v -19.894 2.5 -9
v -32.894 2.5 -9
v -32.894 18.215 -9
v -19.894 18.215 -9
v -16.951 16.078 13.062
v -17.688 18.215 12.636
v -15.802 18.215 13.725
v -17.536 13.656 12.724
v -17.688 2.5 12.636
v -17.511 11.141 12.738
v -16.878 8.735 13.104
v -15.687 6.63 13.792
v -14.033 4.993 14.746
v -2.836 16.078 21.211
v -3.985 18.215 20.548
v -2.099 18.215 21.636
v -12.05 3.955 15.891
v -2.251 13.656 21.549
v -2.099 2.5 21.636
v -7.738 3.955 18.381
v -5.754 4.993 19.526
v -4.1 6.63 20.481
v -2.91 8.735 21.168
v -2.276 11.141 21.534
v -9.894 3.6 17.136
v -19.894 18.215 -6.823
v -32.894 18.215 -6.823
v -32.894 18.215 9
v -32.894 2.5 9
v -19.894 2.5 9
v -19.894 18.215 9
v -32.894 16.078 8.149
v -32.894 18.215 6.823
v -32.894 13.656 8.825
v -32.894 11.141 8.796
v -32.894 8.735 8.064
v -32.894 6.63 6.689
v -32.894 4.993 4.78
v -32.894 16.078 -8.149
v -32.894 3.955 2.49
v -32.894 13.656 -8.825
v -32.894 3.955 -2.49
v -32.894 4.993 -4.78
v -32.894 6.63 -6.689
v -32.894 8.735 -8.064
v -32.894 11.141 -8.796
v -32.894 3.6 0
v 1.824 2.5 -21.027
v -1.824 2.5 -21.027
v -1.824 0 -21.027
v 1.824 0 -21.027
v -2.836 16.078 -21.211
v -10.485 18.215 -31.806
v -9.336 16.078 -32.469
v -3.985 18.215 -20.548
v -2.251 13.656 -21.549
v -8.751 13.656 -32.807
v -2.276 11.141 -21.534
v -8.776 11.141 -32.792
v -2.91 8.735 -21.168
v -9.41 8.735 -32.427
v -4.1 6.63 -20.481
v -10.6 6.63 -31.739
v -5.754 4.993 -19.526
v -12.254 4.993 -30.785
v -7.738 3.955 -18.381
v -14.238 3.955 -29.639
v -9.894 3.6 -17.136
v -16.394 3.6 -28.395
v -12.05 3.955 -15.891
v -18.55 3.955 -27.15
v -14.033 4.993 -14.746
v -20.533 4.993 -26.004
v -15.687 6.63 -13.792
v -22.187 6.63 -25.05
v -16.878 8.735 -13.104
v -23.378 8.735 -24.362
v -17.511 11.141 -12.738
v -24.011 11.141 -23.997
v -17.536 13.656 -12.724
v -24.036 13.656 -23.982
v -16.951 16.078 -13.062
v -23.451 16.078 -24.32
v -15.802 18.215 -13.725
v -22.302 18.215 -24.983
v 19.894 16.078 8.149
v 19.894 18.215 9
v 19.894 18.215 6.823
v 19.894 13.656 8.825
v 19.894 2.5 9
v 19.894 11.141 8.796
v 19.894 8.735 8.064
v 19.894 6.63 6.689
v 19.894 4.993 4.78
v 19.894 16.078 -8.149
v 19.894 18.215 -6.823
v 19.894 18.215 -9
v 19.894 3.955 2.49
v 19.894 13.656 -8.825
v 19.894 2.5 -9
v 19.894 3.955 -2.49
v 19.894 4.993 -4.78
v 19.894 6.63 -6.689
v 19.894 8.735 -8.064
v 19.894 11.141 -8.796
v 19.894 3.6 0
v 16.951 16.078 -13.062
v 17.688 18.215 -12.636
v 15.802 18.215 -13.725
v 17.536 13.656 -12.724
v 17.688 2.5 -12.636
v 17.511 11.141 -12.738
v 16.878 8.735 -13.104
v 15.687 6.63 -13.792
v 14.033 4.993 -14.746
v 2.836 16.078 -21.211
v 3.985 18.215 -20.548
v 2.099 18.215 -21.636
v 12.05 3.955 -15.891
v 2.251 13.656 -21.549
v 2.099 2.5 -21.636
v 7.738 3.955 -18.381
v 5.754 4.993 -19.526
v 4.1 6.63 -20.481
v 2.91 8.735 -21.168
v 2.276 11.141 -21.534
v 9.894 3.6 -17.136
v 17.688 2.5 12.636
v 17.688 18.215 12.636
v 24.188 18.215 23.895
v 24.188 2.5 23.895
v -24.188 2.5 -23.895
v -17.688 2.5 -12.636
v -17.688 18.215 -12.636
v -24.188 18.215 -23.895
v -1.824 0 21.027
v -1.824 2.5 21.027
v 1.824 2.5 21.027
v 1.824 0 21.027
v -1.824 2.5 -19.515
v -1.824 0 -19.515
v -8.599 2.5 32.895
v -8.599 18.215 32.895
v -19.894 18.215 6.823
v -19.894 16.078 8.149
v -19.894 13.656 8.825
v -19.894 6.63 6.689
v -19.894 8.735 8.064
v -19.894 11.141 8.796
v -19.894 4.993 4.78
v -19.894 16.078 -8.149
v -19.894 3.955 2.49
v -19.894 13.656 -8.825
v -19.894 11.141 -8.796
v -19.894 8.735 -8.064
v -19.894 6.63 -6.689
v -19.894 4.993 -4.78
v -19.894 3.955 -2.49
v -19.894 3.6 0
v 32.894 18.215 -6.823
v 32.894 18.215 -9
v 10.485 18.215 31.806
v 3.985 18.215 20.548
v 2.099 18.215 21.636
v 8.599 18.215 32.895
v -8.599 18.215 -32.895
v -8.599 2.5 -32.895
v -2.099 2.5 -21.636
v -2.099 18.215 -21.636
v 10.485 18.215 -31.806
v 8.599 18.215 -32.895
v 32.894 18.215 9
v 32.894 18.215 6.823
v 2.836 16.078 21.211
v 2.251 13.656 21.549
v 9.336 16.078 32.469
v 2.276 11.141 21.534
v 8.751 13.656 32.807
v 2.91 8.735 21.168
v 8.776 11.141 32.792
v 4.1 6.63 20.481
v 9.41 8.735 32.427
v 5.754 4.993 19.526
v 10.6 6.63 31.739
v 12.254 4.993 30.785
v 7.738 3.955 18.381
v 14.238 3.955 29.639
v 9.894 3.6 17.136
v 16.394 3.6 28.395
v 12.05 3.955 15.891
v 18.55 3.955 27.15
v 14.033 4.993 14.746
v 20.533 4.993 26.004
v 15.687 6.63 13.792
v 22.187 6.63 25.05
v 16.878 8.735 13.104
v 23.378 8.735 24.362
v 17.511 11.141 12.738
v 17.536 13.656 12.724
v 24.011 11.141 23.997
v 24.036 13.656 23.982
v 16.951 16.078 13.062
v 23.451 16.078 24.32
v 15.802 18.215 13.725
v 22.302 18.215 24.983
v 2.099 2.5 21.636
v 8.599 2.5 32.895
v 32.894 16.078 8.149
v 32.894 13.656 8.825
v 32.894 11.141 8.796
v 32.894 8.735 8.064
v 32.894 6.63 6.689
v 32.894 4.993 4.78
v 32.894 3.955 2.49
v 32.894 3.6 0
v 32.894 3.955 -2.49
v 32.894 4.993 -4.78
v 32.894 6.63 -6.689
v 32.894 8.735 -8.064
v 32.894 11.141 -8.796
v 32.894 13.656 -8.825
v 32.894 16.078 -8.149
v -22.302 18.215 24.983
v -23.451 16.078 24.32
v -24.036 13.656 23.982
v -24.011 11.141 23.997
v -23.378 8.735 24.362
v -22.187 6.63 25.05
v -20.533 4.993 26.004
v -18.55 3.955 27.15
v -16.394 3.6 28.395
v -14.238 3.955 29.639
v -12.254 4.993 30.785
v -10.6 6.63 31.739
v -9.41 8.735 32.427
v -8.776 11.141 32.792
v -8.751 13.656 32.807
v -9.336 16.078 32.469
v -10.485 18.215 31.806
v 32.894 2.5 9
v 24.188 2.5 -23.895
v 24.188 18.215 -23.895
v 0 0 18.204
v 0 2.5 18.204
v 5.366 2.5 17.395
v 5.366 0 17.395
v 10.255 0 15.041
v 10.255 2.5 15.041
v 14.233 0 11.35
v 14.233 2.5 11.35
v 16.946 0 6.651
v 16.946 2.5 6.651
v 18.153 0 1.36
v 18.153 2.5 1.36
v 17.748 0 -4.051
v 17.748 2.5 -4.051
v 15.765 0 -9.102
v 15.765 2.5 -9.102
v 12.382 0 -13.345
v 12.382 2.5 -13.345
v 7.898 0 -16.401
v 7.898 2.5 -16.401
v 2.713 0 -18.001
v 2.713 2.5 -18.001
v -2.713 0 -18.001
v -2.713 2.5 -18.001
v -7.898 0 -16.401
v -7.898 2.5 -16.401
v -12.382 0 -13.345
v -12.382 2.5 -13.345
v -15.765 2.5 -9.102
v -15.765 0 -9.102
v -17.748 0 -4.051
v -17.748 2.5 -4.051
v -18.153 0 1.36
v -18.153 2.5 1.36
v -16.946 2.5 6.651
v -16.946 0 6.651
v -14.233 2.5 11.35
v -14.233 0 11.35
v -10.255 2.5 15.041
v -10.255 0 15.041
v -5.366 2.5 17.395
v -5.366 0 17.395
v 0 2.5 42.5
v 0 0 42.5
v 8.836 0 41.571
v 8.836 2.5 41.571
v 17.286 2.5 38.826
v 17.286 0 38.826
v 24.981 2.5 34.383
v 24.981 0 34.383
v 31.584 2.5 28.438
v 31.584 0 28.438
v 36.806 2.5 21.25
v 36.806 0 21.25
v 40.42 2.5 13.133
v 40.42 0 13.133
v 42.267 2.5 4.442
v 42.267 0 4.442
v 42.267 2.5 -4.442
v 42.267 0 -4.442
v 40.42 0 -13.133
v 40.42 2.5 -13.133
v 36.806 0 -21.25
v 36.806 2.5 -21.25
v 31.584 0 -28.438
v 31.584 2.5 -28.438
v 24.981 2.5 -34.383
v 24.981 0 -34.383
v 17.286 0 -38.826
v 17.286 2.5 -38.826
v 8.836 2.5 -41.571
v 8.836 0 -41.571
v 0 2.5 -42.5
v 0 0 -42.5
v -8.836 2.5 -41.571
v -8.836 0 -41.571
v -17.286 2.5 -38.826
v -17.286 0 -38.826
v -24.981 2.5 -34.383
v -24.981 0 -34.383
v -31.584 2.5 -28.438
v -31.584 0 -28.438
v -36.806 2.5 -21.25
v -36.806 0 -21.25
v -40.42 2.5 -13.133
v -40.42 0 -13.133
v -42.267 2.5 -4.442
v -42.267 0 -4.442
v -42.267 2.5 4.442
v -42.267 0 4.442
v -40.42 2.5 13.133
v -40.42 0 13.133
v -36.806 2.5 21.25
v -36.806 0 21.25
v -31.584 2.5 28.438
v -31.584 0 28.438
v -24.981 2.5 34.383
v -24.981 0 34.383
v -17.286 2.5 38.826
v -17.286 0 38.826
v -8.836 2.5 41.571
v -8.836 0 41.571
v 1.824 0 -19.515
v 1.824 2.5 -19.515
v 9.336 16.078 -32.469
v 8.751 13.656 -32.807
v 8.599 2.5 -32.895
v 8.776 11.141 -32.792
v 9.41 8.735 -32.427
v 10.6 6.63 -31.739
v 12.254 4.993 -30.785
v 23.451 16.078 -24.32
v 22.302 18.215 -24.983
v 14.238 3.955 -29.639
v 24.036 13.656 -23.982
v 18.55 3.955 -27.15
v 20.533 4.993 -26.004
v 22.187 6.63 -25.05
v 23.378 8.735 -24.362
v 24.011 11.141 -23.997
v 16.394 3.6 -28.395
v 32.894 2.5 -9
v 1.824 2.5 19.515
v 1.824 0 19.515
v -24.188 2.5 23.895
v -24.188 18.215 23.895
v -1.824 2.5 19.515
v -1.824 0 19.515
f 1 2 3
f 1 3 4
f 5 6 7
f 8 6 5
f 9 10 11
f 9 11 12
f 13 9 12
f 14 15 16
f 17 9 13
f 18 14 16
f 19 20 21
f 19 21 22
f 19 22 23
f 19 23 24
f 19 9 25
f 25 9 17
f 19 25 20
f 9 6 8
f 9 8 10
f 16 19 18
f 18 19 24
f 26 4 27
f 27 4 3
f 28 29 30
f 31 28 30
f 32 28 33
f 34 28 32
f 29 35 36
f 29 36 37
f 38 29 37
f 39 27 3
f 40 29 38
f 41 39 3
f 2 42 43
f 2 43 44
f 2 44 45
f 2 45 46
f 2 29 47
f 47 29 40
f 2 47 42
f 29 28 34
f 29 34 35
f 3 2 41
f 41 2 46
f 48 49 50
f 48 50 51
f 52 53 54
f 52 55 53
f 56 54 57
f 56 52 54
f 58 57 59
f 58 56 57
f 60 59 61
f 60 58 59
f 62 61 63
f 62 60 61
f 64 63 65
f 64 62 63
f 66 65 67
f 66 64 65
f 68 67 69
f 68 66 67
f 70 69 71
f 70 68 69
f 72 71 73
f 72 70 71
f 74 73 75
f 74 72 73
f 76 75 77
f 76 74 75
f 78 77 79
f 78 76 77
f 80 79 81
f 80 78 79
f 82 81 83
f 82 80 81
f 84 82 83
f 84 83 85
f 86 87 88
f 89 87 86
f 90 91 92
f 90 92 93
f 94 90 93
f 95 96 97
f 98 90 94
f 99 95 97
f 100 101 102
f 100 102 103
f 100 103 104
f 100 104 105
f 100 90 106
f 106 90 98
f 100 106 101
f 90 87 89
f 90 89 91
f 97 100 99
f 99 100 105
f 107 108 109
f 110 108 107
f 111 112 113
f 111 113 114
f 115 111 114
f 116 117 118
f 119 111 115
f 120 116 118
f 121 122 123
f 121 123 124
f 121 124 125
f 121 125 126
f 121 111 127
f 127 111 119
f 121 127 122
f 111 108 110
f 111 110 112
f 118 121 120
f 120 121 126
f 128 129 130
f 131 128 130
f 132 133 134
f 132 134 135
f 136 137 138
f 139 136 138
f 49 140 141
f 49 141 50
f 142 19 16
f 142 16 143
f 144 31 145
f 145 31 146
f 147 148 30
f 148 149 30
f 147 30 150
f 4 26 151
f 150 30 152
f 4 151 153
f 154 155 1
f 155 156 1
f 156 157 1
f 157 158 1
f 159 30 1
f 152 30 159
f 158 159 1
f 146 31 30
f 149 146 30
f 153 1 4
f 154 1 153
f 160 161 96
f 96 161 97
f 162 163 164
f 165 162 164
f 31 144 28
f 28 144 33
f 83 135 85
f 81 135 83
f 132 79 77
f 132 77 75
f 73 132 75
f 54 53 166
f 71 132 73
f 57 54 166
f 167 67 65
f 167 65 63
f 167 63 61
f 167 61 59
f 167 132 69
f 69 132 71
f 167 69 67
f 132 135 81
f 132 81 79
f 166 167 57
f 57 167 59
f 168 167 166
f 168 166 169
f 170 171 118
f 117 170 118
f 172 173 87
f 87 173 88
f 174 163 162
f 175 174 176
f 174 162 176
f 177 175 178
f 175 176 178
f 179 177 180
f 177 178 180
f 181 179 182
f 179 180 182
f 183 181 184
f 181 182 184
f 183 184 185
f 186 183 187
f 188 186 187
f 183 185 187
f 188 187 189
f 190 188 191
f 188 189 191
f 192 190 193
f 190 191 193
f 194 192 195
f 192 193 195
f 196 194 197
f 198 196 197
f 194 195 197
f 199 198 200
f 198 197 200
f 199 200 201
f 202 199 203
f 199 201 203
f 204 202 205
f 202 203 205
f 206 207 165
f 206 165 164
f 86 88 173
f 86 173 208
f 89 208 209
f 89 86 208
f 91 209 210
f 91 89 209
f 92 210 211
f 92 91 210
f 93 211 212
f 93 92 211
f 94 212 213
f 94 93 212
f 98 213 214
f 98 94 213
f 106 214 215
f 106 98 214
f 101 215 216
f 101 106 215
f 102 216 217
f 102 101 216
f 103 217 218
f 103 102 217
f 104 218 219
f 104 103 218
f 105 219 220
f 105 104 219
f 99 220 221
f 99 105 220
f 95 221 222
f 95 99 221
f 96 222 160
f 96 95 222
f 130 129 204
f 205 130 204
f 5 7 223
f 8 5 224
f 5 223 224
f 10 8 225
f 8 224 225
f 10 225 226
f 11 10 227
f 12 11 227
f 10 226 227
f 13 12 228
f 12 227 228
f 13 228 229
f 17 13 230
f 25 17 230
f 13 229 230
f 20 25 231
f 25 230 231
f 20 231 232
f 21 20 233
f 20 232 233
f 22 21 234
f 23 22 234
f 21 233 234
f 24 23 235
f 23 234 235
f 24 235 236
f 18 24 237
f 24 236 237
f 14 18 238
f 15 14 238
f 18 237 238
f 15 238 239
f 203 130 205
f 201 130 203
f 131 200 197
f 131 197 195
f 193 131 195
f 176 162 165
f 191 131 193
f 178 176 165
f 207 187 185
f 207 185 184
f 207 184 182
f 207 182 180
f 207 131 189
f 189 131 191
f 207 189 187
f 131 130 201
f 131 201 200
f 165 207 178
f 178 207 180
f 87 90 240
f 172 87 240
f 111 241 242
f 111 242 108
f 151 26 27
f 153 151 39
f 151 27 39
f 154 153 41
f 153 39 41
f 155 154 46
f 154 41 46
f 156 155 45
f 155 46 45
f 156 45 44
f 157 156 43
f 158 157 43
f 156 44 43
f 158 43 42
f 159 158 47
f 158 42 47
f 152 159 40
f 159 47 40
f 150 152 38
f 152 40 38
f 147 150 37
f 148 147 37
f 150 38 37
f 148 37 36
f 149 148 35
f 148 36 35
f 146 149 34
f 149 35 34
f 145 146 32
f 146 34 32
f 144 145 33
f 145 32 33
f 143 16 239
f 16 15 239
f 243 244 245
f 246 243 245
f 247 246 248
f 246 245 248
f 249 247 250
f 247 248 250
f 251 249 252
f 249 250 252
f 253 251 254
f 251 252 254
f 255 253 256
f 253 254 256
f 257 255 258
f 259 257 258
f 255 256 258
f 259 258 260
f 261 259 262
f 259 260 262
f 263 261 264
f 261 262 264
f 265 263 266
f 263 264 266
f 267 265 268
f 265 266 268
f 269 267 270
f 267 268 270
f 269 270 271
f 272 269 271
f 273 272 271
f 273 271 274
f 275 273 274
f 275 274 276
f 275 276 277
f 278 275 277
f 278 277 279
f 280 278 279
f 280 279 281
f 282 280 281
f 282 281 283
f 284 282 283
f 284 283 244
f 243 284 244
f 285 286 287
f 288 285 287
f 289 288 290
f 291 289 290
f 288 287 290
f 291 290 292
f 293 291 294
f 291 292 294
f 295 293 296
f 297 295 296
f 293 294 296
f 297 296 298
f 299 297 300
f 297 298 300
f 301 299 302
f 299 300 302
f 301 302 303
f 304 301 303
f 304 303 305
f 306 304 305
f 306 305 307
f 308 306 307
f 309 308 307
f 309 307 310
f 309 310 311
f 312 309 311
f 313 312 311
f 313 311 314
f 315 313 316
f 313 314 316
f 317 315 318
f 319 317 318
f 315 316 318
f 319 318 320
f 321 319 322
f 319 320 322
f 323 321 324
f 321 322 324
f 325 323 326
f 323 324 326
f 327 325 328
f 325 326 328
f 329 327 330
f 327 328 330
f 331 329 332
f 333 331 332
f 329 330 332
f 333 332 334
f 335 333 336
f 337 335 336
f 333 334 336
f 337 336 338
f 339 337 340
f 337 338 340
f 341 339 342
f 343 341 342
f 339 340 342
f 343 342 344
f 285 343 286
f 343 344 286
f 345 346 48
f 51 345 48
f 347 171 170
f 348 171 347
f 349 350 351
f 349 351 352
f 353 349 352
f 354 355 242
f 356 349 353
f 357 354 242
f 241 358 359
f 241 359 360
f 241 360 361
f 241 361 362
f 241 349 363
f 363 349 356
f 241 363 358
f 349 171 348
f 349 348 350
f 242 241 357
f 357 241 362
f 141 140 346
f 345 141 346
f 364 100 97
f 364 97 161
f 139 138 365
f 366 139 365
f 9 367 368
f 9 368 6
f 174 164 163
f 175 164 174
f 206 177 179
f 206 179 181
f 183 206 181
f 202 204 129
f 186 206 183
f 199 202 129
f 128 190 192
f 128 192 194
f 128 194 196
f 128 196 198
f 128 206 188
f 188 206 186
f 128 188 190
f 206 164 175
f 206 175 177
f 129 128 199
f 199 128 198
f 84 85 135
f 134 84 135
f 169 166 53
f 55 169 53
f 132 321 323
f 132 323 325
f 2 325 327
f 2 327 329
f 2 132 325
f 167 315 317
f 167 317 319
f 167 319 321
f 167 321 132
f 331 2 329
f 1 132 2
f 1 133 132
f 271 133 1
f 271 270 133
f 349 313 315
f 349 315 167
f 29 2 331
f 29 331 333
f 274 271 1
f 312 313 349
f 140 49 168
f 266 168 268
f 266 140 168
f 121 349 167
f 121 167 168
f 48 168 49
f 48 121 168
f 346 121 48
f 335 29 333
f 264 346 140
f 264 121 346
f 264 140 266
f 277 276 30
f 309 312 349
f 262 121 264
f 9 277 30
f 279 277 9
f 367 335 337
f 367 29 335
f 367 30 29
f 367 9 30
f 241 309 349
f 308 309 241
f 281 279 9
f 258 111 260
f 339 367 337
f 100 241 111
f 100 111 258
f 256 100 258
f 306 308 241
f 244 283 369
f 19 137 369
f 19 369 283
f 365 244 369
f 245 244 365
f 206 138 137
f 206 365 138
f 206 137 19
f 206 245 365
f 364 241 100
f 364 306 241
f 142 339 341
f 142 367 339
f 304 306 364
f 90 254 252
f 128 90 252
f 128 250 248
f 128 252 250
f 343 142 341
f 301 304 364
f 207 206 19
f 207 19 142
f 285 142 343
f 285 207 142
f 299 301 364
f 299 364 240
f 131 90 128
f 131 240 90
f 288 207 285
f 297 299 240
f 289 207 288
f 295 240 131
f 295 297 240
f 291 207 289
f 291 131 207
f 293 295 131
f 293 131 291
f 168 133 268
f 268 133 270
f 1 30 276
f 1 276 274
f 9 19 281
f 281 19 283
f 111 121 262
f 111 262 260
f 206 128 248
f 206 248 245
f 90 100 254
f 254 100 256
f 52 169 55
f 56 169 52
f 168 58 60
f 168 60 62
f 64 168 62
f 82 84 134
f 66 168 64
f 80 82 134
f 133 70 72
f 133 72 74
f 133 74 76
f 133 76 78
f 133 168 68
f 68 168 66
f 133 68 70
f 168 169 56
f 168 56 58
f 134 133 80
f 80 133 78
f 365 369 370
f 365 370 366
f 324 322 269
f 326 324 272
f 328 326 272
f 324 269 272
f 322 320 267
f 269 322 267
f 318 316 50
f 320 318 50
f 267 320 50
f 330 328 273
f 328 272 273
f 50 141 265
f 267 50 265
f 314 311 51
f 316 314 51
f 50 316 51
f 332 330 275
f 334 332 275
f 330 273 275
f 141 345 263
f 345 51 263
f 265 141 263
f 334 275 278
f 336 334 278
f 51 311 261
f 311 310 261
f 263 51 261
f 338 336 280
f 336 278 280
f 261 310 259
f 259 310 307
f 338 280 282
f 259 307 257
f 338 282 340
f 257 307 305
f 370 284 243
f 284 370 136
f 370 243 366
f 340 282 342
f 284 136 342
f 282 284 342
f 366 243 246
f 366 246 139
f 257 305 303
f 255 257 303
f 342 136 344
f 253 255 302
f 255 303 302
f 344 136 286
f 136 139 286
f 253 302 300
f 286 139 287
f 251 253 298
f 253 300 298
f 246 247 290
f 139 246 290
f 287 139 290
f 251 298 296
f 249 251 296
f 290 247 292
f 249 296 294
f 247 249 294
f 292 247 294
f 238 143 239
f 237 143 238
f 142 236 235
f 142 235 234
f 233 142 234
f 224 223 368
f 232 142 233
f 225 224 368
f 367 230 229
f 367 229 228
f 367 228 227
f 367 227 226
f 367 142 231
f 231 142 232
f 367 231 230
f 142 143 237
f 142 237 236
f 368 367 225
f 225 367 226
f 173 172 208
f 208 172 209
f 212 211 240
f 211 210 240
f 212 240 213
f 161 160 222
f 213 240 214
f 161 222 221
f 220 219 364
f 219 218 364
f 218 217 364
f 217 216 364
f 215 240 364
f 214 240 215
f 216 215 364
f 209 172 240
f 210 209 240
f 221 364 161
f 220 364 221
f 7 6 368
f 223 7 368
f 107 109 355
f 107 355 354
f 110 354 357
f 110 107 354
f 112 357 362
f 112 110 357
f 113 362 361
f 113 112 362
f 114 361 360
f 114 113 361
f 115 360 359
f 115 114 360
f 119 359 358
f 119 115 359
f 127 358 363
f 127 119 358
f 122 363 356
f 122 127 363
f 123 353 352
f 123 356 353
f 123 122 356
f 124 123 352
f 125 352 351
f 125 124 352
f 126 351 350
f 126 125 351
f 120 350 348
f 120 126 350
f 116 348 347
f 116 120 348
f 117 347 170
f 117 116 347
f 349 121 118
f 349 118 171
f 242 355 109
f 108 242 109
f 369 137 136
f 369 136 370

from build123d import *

# Parameters (mm, degrees)
SKETCH1_R           = 42.5
BOSS_EXTRUDE1_DEPTH = 2.5
SKETCH3_W           = 13
SKETCH3_H           = 18
BOSS_EXTRUDE2_DEPTH = 20
SKETCH4_R           = 8.9
CUT_EXTRUDE2_DEPTH  = 20
SKETCH5_R           = 8.9
CUT_EXTRUDE3_DEPTH  = 20
SKETCH6_R           = 8.9
CUT_EXTRUDE4_DEPTH  = 20
CUT_EXTRUDE5_START  = -20
SKETCH7_R           = 8.9
CUT_EXTRUDE5_DEPTH  = 20
CUT_EXTRUDE6_START  = -20
SKETCH8_R           = 8.9
CUT_EXTRUDE6_DEPTH  = 20
CUT_EXTRUDE7_START  = -20
SKETCH9_R           = 8.9
CUT_EXTRUDE7_DEPTH  = 20
CUT_EXTRUDE8_DEPTH  = 76.388
SKETCH11_W          = 18
SKETCH11_H          = 4.285356177
CUT_EXTRUDE9_DEPTH  = 76.388
SKETCH12_R          = 18.204170311
CUT_EXTRUDE10_DEPTH = 76.388
SKETCH16_W          = 3.647311836
SKETCH16_H          = 1.511893876
CUT_EXTRUDE13_DEPTH = 101.6


with BuildPart() as part:
    # Sketch1 → Boss-Extrude1 (new body)
    with BuildSketch(Plane(origin=(0, 0, 0), x_dir=(1, 0, 0), z_dir=(0, 1, 0))):
        Circle(SKETCH1_R)
    extrude(amount=BOSS_EXTRUDE1_DEPTH)

    # Sketch3 → Boss-Extrude2 (add)
    with BuildSketch(Plane(origin=(0, 2.5, 0), x_dir=(1, 0, 0), z_dir=(0, 1, 0))):
        with Locations((-26.394376419, 0)):
            Rectangle(SKETCH3_W, SKETCH3_H)
        with Locations((26.394376419, 0)):
            Rectangle(SKETCH3_W, SKETCH3_H)
        Polygon((-8.599367677, 32.894541729), (-2.099367677, 21.63621148), (-17.687824945, 12.63621148), (-24.187824945, 23.894541729), align=None)
        Polygon((8.599367677, 32.894541729), (24.187824945, 23.894541729), (17.687824945, 12.63621148), (2.099367677, 21.63621148), align=None)
        Polygon((8.599367677, -32.894541729), (2.099367677, -21.63621148), (17.687824945, -12.63621148), (24.187824945, -23.894541729), align=None)
        Polygon((-8.599367677, -32.894541729), (-24.187824945, -23.894541729), (-17.687824945, -12.63621148), (-2.099367677, -21.63621148), align=None)
    extrude(amount=BOSS_EXTRUDE2_DEPTH)

    # Sketch4 → Cut-Extrude2 (cut)
    with BuildSketch(Plane.ZY.offset(32.894376419)):
        with Locations((0, 12.5)):
            Circle(SKETCH4_R)
    extrude(amount=-CUT_EXTRUDE2_DEPTH, mode=Mode.SUBTRACT)

    # Sketch5 → Cut-Extrude3 (cut)
    with BuildSketch(Plane(origin=(-16.393596311, 0, 28.394541729), x_dir=(0.8660254037844386, 0, 0.5000000000000003), z_dir=(-0.5000000000000003, 0, 0.8660254037844386))):
        with Locations((0, 12.5)):
            Circle(SKETCH5_R)
    extrude(amount=-CUT_EXTRUDE3_DEPTH, mode=Mode.SUBTRACT)

    # Sketch6 → Cut-Extrude4 (cut)
    with BuildSketch(Plane(origin=(16.393596311, 0, 28.394541729), x_dir=(0.8660254037844386, 0, -0.5000000000000003), z_dir=(0.5000000000000003, 0, 0.8660254037844386))):
        with Locations((0, 12.5)):
            Circle(SKETCH6_R)
    extrude(amount=-CUT_EXTRUDE4_DEPTH, mode=Mode.SUBTRACT)

    # Sketch7 → Cut-Extrude5 (cut)
    with BuildSketch(Plane(origin=(32.894376419, 0, 0), x_dir=(0, 0, -1), z_dir=(1, 0, 0)).offset(CUT_EXTRUDE5_START)):
        with Locations((0, 12.5)):
            Circle(SKETCH7_R)
    extrude(amount=CUT_EXTRUDE5_DEPTH, mode=Mode.SUBTRACT)

    # Sketch8 → Cut-Extrude6 (cut)
    with BuildSketch(Plane(origin=(16.393596311, 0, -28.394541729), x_dir=(-0.8660254037844386, 0, -0.5000000000000003), z_dir=(0.5000000000000003, 0, -0.8660254037844386)).offset(CUT_EXTRUDE6_START)):
        with Locations((0, 12.5)):
            Circle(SKETCH8_R)
    extrude(amount=CUT_EXTRUDE6_DEPTH, mode=Mode.SUBTRACT)

    # Sketch9 → Cut-Extrude7 (cut)
    with BuildSketch(Plane(origin=(-16.393596311, 0, -28.394541729), x_dir=(-0.8660254037844386, 0, 0.5000000000000003), z_dir=(-0.5000000000000003, 0, -0.8660254037844386)).offset(CUT_EXTRUDE7_START)):
        with Locations((0, 12.5)):
            Circle(SKETCH9_R)
    extrude(amount=CUT_EXTRUDE7_DEPTH, mode=Mode.SUBTRACT)

    # Sketch10 → Cut-Extrude8 (cut)
    with BuildSketch(Plane(origin=(-16.393596311, 0, -28.394541729), x_dir=(-0.8660254037844386, 0, 0.5000000000000003), z_dir=(-0.5000000000000003, 0, -0.8660254037844386))):
        Polygon((-35.669118209, 18.214643823), (-9, 18.214643823), (-9, 22.5), (9, 22.5), (9, 18.214643823), (33.747549551, 18.214643823), (33.747549551, 25.559573076), (-35.669118209, 25.559573076), align=None)
    extrude(amount=-CUT_EXTRUDE8_DEPTH, mode=Mode.SUBTRACT)

    # Sketch11 → Cut-Extrude9 (cut)
    with BuildSketch(Plane(origin=(-16.393596311, 0, -28.394541729), x_dir=(-0.8660254037844386, 0, 0.5000000000000003), z_dir=(-0.5000000000000003, 0, -0.8660254037844386))):
        with Locations((0, 20.357321912)):
            Rectangle(SKETCH11_W, SKETCH11_H)
    extrude(amount=-CUT_EXTRUDE9_DEPTH, mode=Mode.SUBTRACT)

    # Sketch12 → Cut-Extrude10 (cut)
    with BuildSketch(Plane(origin=(0, 2.5, 0), x_dir=(1, 0, 0), z_dir=(0, 1, 0))):
        Circle(SKETCH12_R)
    extrude(amount=-CUT_EXTRUDE10_DEPTH, mode=Mode.SUBTRACT)

    # Sketch16 → Cut-Extrude13 (cut)
    with BuildSketch(Plane(origin=(0, 2.5, 0), x_dir=(1, 0, 0), z_dir=(0, 1, 0))):
        with Locations((0, -20.271174186)):
            Rectangle(SKETCH16_W, SKETCH16_H)
        with Locations((0, 20.271174186)):
            Rectangle(SKETCH16_W, SKETCH16_H)
    extrude(amount=-CUT_EXTRUDE13_DEPTH, mode=Mode.SUBTRACT)


solid = part.part
